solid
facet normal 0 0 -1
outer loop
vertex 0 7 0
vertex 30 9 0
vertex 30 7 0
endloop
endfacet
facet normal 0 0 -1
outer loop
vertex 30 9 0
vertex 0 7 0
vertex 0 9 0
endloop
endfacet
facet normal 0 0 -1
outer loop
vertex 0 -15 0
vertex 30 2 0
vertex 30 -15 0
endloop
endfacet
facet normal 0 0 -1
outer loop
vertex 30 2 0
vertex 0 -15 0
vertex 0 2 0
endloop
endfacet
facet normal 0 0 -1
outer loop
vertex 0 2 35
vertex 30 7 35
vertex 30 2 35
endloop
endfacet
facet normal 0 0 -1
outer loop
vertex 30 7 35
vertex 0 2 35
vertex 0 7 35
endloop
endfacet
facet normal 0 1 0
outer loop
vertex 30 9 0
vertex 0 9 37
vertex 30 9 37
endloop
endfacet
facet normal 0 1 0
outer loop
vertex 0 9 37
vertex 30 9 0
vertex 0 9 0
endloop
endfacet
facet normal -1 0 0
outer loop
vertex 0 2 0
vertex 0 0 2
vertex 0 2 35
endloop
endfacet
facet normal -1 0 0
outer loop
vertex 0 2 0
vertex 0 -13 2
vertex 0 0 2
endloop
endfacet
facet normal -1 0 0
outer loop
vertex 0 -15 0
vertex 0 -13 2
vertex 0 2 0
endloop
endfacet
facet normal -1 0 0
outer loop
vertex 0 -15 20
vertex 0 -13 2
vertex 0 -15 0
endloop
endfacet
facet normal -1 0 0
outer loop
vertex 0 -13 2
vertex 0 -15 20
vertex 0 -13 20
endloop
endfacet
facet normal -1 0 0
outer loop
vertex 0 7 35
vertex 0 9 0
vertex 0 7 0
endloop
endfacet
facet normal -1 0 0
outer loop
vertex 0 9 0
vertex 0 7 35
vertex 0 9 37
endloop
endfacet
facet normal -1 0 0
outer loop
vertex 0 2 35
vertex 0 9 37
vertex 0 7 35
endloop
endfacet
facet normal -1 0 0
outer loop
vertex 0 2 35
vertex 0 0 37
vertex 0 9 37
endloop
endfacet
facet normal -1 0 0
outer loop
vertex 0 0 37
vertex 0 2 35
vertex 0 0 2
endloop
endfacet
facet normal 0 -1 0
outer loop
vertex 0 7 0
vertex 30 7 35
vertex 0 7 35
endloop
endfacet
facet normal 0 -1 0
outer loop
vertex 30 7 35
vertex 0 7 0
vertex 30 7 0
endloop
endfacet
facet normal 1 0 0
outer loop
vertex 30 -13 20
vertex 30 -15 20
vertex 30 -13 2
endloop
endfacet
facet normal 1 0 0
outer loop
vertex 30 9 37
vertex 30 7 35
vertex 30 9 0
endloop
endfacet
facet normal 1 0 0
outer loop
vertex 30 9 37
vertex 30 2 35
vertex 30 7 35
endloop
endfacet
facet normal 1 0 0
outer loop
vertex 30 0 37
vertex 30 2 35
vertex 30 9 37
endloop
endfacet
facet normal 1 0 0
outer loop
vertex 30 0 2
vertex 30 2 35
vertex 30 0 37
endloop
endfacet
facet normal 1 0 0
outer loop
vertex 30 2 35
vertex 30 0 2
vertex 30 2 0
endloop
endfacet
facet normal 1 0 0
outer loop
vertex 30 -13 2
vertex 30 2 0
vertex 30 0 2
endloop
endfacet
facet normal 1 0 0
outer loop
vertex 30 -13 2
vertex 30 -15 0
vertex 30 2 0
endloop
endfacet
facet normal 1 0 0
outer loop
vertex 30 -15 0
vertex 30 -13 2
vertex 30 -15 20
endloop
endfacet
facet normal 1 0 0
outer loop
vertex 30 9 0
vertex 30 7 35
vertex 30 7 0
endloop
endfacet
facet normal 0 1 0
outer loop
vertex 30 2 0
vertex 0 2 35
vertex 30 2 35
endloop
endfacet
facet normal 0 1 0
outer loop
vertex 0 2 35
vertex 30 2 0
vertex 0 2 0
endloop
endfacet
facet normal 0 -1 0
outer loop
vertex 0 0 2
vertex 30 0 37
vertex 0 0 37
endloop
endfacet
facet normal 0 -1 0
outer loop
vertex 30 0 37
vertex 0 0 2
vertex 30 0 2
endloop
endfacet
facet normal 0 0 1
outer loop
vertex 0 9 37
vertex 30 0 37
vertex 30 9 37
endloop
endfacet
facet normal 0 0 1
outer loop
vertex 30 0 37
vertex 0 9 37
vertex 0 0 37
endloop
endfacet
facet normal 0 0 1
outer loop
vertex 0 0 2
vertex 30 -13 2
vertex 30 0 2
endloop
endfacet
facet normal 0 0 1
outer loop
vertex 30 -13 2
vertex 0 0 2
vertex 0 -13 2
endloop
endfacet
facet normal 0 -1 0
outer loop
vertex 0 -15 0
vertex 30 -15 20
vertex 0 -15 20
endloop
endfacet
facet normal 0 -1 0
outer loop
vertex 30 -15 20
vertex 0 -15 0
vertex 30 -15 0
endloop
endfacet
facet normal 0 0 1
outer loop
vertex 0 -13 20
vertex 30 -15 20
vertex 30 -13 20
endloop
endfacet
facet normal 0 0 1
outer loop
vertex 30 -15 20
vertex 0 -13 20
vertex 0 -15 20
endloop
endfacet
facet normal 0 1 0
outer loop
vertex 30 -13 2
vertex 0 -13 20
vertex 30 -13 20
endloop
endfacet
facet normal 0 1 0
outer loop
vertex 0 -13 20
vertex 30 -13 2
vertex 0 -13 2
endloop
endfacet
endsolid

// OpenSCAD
// thickness of the matreial(glass) yu want to slide it on in mm
glass_thickness = 5;
// lengh of the part which is sliding onto the glass in mm
grabber_length = 35;
// widht of the holder in mm
grabber_width = 30;
// thicknss of the used plastic in mm
Material_thickness = 2;
union(){
  linear_extrude( height=grabber_length, twist=0, scale=[1, 1], center=false){
    union(){
      square([grabber_width, Material_thickness], center=false);
      translate([0, (glass_thickness + Material_thickness * 1), 0]){
        square([grabber_width, Material_thickness], center=false);
      }
    }
  }
  translate([0, 0, grabber_length]){
    cube([grabber_width, (glass_thickness + Material_thickness * 2), Material_thickness], center=false);
  }
  translate([0, -15, 0]){
    cube([grabber_width, 15, Material_thickness], center=false);
  }
  translate([0, -15, 0]){
    cube([grabber_width, Material_thickness, 20], center=false);
  }
}
